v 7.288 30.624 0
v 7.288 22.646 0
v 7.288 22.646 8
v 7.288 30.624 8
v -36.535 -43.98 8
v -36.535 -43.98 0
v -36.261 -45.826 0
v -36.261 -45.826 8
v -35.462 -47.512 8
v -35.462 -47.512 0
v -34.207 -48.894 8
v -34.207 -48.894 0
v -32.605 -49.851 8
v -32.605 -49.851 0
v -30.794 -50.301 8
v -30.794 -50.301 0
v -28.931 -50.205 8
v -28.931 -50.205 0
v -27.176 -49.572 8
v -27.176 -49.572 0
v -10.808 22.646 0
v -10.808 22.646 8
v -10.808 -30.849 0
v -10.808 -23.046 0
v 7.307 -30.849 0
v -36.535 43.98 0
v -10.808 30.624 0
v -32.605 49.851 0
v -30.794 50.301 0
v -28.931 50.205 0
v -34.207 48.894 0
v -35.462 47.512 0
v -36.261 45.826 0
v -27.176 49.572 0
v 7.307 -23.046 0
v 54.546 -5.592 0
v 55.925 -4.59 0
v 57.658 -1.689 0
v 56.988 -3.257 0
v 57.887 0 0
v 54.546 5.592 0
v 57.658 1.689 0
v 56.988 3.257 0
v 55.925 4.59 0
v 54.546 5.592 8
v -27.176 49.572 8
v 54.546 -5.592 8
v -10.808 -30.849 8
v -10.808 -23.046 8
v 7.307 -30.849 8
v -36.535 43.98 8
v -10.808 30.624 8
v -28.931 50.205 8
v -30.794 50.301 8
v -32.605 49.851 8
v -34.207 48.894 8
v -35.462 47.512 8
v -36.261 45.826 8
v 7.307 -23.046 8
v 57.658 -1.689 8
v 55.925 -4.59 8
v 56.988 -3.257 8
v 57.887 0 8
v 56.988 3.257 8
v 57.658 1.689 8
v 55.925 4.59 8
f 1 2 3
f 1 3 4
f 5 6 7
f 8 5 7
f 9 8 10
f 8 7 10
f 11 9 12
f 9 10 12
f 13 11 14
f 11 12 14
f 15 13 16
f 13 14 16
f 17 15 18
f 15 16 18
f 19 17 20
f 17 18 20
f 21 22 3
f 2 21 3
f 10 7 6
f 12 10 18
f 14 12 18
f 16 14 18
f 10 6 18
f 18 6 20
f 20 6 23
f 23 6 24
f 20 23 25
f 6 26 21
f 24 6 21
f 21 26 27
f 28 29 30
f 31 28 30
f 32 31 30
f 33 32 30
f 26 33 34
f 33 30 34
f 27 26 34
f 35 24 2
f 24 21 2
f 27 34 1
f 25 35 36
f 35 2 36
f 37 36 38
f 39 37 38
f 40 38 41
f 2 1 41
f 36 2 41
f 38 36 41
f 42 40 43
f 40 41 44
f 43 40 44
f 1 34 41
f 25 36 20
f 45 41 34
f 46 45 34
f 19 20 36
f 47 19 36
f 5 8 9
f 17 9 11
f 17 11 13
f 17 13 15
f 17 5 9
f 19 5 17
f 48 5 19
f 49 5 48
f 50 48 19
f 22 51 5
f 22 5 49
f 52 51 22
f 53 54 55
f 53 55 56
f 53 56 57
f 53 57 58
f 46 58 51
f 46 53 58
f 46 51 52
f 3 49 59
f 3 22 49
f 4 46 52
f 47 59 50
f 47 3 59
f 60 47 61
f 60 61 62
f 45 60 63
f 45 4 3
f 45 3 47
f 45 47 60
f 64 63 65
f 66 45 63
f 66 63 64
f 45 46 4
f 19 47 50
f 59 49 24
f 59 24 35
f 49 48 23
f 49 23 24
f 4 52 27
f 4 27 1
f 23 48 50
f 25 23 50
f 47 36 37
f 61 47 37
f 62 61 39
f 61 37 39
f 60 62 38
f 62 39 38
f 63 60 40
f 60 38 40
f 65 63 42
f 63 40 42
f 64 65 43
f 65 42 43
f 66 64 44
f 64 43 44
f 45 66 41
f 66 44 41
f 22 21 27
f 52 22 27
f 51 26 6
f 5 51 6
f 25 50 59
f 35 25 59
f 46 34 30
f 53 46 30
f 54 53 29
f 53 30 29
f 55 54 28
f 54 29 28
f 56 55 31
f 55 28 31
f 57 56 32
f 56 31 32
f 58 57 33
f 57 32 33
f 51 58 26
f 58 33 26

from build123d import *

# Parameters (mm, degrees)
F1_DEPTH = 8
F3_W     = 18.096443
F3_H     = 7.978035
F5_DEPTH = 8
F4_W     = 18.115349
F4_H     = 7.803778
F6_DEPTH = 8


with BuildPart() as f1:
    # F0 (on Top) → F1 (new body)
    with BuildSketch(Plane.XY):
        with BuildLine():
            ThreePointArc((54.546267, -5.591677), (57.887006, 0), (54.546267, 5.591677))
            Line((54.546267, 5.591677), (-27.175577, 49.571755))
            ThreePointArc((-27.175577, 49.571755), (-33.441654, 49.431285), (-36.534838, 43.980078))
            Line((-36.534838, 43.980078), (-36.534838, -43.980078))
            ThreePointArc((-36.534838, -43.980078), (-33.441654, -49.431285), (-27.175577, -49.571755))
            Line((-27.175577, -49.571755), (54.546267, -5.591677))
        make_face()
    extrude(amount=F1_DEPTH)

    # F3 (on face) → F5 (cut)
    with BuildSketch(Plane.XY.offset(8)):
        with Locations((-1.760172, 26.635416)):
            Rectangle(F3_W, F3_H)
    extrude(amount=-F5_DEPTH, mode=Mode.SUBTRACT)

    # F4 (on face) → F6 (cut)
    with BuildSketch(Plane.XY.offset(8)):
        with Locations((-1.75072, -26.947488)):
            Rectangle(F4_W, F4_H)
    extrude(amount=-F6_DEPTH, mode=Mode.SUBTRACT)


solid = f1.part
